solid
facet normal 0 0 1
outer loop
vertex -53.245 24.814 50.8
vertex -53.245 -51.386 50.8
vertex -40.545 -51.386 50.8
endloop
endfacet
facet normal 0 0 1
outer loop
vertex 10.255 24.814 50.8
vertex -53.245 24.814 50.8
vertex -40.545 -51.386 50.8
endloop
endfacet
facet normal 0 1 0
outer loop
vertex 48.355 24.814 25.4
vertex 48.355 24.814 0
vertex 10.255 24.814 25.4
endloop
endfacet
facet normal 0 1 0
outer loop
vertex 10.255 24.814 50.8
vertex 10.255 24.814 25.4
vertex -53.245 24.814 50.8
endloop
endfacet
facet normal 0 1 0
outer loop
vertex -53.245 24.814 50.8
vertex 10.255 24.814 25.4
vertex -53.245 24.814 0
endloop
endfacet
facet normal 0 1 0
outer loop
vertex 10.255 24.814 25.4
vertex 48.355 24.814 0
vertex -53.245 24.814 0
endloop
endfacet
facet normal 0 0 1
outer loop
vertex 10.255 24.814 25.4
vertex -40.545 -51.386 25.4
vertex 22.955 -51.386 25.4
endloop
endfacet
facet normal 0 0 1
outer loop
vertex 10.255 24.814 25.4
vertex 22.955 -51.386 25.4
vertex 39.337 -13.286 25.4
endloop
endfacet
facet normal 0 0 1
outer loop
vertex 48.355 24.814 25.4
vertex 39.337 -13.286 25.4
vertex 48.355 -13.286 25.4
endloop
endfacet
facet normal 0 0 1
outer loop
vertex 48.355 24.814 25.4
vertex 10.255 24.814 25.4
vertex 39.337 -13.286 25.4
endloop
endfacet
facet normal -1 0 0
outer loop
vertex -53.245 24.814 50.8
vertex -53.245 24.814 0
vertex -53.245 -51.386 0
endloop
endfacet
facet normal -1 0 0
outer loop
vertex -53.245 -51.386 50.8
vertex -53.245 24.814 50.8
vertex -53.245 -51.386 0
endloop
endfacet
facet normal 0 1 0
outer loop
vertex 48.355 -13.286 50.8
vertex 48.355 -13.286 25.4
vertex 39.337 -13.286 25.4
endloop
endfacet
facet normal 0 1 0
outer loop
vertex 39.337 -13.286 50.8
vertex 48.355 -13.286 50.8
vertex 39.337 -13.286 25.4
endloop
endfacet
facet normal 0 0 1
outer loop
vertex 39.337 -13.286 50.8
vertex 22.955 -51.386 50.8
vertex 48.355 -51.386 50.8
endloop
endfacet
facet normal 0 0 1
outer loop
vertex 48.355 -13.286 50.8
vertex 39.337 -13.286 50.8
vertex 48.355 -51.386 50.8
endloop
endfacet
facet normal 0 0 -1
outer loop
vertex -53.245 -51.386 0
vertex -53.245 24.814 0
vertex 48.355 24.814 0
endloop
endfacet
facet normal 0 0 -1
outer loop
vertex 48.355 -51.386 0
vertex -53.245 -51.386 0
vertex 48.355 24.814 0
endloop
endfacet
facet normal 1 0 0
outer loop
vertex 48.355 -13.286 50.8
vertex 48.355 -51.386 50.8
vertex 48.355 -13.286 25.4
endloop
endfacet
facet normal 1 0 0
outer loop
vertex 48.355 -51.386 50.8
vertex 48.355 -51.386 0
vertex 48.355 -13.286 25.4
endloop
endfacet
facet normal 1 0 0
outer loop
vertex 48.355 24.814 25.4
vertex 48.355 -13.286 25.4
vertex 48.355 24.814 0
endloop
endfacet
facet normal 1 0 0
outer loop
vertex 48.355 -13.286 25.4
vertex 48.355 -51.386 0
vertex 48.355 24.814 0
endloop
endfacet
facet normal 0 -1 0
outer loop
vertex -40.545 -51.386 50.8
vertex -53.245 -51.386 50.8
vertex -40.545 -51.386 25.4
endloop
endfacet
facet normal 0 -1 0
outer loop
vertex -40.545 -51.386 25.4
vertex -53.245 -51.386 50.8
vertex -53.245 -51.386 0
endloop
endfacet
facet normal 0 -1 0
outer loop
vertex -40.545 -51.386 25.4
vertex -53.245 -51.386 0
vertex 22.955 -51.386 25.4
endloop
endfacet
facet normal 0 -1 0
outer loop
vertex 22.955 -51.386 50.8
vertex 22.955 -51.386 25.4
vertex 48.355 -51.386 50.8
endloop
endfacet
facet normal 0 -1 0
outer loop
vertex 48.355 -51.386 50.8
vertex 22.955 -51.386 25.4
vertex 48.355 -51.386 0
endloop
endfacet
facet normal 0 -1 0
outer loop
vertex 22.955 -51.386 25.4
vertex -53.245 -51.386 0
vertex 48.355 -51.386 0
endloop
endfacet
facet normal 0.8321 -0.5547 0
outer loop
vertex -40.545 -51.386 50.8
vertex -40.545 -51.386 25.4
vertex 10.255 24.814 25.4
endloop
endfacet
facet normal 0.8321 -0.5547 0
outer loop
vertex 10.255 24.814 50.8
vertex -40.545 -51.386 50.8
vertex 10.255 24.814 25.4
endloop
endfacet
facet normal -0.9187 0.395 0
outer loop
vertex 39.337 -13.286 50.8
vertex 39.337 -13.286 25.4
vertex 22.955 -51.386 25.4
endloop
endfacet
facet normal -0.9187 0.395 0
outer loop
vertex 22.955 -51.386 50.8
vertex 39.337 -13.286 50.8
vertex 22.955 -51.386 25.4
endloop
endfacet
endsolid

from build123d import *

# Parameters (mm, degrees)
F0_W     = 101.6
F0_H     = 76.2
F1_DEPTH = 25.4
F3_DEPTH = 25.4
F5_DEPTH = 25.4


with BuildPart() as f1:
    # F0 (on Top) → F1 (new body)
    with BuildSketch(Plane.XY):
        with Locations((-2.444915, -13.285797)):
            Rectangle(F0_W, F0_H)
    extrude(amount=F1_DEPTH)

    # F2 (on face) → F3 (join)
    with BuildSketch(Plane.XY.offset(25.4)):
        Polygon((-53.244915, 24.814203), (-53.244915, -51.385797), (-40.544915, -51.385797), (10.255085, 24.814203), align=None)
    extrude(amount=F3_DEPTH)

    # F4 (on face) → F5 (join)
    with BuildSketch(Plane.XY.offset(25.4)):
        Polygon((22.955085, -51.385797), (48.355085, -51.385797), (48.355085, -13.285797), (39.337236, -13.285797), align=None)
    extrude(amount=F5_DEPTH)


solid = f1.part
